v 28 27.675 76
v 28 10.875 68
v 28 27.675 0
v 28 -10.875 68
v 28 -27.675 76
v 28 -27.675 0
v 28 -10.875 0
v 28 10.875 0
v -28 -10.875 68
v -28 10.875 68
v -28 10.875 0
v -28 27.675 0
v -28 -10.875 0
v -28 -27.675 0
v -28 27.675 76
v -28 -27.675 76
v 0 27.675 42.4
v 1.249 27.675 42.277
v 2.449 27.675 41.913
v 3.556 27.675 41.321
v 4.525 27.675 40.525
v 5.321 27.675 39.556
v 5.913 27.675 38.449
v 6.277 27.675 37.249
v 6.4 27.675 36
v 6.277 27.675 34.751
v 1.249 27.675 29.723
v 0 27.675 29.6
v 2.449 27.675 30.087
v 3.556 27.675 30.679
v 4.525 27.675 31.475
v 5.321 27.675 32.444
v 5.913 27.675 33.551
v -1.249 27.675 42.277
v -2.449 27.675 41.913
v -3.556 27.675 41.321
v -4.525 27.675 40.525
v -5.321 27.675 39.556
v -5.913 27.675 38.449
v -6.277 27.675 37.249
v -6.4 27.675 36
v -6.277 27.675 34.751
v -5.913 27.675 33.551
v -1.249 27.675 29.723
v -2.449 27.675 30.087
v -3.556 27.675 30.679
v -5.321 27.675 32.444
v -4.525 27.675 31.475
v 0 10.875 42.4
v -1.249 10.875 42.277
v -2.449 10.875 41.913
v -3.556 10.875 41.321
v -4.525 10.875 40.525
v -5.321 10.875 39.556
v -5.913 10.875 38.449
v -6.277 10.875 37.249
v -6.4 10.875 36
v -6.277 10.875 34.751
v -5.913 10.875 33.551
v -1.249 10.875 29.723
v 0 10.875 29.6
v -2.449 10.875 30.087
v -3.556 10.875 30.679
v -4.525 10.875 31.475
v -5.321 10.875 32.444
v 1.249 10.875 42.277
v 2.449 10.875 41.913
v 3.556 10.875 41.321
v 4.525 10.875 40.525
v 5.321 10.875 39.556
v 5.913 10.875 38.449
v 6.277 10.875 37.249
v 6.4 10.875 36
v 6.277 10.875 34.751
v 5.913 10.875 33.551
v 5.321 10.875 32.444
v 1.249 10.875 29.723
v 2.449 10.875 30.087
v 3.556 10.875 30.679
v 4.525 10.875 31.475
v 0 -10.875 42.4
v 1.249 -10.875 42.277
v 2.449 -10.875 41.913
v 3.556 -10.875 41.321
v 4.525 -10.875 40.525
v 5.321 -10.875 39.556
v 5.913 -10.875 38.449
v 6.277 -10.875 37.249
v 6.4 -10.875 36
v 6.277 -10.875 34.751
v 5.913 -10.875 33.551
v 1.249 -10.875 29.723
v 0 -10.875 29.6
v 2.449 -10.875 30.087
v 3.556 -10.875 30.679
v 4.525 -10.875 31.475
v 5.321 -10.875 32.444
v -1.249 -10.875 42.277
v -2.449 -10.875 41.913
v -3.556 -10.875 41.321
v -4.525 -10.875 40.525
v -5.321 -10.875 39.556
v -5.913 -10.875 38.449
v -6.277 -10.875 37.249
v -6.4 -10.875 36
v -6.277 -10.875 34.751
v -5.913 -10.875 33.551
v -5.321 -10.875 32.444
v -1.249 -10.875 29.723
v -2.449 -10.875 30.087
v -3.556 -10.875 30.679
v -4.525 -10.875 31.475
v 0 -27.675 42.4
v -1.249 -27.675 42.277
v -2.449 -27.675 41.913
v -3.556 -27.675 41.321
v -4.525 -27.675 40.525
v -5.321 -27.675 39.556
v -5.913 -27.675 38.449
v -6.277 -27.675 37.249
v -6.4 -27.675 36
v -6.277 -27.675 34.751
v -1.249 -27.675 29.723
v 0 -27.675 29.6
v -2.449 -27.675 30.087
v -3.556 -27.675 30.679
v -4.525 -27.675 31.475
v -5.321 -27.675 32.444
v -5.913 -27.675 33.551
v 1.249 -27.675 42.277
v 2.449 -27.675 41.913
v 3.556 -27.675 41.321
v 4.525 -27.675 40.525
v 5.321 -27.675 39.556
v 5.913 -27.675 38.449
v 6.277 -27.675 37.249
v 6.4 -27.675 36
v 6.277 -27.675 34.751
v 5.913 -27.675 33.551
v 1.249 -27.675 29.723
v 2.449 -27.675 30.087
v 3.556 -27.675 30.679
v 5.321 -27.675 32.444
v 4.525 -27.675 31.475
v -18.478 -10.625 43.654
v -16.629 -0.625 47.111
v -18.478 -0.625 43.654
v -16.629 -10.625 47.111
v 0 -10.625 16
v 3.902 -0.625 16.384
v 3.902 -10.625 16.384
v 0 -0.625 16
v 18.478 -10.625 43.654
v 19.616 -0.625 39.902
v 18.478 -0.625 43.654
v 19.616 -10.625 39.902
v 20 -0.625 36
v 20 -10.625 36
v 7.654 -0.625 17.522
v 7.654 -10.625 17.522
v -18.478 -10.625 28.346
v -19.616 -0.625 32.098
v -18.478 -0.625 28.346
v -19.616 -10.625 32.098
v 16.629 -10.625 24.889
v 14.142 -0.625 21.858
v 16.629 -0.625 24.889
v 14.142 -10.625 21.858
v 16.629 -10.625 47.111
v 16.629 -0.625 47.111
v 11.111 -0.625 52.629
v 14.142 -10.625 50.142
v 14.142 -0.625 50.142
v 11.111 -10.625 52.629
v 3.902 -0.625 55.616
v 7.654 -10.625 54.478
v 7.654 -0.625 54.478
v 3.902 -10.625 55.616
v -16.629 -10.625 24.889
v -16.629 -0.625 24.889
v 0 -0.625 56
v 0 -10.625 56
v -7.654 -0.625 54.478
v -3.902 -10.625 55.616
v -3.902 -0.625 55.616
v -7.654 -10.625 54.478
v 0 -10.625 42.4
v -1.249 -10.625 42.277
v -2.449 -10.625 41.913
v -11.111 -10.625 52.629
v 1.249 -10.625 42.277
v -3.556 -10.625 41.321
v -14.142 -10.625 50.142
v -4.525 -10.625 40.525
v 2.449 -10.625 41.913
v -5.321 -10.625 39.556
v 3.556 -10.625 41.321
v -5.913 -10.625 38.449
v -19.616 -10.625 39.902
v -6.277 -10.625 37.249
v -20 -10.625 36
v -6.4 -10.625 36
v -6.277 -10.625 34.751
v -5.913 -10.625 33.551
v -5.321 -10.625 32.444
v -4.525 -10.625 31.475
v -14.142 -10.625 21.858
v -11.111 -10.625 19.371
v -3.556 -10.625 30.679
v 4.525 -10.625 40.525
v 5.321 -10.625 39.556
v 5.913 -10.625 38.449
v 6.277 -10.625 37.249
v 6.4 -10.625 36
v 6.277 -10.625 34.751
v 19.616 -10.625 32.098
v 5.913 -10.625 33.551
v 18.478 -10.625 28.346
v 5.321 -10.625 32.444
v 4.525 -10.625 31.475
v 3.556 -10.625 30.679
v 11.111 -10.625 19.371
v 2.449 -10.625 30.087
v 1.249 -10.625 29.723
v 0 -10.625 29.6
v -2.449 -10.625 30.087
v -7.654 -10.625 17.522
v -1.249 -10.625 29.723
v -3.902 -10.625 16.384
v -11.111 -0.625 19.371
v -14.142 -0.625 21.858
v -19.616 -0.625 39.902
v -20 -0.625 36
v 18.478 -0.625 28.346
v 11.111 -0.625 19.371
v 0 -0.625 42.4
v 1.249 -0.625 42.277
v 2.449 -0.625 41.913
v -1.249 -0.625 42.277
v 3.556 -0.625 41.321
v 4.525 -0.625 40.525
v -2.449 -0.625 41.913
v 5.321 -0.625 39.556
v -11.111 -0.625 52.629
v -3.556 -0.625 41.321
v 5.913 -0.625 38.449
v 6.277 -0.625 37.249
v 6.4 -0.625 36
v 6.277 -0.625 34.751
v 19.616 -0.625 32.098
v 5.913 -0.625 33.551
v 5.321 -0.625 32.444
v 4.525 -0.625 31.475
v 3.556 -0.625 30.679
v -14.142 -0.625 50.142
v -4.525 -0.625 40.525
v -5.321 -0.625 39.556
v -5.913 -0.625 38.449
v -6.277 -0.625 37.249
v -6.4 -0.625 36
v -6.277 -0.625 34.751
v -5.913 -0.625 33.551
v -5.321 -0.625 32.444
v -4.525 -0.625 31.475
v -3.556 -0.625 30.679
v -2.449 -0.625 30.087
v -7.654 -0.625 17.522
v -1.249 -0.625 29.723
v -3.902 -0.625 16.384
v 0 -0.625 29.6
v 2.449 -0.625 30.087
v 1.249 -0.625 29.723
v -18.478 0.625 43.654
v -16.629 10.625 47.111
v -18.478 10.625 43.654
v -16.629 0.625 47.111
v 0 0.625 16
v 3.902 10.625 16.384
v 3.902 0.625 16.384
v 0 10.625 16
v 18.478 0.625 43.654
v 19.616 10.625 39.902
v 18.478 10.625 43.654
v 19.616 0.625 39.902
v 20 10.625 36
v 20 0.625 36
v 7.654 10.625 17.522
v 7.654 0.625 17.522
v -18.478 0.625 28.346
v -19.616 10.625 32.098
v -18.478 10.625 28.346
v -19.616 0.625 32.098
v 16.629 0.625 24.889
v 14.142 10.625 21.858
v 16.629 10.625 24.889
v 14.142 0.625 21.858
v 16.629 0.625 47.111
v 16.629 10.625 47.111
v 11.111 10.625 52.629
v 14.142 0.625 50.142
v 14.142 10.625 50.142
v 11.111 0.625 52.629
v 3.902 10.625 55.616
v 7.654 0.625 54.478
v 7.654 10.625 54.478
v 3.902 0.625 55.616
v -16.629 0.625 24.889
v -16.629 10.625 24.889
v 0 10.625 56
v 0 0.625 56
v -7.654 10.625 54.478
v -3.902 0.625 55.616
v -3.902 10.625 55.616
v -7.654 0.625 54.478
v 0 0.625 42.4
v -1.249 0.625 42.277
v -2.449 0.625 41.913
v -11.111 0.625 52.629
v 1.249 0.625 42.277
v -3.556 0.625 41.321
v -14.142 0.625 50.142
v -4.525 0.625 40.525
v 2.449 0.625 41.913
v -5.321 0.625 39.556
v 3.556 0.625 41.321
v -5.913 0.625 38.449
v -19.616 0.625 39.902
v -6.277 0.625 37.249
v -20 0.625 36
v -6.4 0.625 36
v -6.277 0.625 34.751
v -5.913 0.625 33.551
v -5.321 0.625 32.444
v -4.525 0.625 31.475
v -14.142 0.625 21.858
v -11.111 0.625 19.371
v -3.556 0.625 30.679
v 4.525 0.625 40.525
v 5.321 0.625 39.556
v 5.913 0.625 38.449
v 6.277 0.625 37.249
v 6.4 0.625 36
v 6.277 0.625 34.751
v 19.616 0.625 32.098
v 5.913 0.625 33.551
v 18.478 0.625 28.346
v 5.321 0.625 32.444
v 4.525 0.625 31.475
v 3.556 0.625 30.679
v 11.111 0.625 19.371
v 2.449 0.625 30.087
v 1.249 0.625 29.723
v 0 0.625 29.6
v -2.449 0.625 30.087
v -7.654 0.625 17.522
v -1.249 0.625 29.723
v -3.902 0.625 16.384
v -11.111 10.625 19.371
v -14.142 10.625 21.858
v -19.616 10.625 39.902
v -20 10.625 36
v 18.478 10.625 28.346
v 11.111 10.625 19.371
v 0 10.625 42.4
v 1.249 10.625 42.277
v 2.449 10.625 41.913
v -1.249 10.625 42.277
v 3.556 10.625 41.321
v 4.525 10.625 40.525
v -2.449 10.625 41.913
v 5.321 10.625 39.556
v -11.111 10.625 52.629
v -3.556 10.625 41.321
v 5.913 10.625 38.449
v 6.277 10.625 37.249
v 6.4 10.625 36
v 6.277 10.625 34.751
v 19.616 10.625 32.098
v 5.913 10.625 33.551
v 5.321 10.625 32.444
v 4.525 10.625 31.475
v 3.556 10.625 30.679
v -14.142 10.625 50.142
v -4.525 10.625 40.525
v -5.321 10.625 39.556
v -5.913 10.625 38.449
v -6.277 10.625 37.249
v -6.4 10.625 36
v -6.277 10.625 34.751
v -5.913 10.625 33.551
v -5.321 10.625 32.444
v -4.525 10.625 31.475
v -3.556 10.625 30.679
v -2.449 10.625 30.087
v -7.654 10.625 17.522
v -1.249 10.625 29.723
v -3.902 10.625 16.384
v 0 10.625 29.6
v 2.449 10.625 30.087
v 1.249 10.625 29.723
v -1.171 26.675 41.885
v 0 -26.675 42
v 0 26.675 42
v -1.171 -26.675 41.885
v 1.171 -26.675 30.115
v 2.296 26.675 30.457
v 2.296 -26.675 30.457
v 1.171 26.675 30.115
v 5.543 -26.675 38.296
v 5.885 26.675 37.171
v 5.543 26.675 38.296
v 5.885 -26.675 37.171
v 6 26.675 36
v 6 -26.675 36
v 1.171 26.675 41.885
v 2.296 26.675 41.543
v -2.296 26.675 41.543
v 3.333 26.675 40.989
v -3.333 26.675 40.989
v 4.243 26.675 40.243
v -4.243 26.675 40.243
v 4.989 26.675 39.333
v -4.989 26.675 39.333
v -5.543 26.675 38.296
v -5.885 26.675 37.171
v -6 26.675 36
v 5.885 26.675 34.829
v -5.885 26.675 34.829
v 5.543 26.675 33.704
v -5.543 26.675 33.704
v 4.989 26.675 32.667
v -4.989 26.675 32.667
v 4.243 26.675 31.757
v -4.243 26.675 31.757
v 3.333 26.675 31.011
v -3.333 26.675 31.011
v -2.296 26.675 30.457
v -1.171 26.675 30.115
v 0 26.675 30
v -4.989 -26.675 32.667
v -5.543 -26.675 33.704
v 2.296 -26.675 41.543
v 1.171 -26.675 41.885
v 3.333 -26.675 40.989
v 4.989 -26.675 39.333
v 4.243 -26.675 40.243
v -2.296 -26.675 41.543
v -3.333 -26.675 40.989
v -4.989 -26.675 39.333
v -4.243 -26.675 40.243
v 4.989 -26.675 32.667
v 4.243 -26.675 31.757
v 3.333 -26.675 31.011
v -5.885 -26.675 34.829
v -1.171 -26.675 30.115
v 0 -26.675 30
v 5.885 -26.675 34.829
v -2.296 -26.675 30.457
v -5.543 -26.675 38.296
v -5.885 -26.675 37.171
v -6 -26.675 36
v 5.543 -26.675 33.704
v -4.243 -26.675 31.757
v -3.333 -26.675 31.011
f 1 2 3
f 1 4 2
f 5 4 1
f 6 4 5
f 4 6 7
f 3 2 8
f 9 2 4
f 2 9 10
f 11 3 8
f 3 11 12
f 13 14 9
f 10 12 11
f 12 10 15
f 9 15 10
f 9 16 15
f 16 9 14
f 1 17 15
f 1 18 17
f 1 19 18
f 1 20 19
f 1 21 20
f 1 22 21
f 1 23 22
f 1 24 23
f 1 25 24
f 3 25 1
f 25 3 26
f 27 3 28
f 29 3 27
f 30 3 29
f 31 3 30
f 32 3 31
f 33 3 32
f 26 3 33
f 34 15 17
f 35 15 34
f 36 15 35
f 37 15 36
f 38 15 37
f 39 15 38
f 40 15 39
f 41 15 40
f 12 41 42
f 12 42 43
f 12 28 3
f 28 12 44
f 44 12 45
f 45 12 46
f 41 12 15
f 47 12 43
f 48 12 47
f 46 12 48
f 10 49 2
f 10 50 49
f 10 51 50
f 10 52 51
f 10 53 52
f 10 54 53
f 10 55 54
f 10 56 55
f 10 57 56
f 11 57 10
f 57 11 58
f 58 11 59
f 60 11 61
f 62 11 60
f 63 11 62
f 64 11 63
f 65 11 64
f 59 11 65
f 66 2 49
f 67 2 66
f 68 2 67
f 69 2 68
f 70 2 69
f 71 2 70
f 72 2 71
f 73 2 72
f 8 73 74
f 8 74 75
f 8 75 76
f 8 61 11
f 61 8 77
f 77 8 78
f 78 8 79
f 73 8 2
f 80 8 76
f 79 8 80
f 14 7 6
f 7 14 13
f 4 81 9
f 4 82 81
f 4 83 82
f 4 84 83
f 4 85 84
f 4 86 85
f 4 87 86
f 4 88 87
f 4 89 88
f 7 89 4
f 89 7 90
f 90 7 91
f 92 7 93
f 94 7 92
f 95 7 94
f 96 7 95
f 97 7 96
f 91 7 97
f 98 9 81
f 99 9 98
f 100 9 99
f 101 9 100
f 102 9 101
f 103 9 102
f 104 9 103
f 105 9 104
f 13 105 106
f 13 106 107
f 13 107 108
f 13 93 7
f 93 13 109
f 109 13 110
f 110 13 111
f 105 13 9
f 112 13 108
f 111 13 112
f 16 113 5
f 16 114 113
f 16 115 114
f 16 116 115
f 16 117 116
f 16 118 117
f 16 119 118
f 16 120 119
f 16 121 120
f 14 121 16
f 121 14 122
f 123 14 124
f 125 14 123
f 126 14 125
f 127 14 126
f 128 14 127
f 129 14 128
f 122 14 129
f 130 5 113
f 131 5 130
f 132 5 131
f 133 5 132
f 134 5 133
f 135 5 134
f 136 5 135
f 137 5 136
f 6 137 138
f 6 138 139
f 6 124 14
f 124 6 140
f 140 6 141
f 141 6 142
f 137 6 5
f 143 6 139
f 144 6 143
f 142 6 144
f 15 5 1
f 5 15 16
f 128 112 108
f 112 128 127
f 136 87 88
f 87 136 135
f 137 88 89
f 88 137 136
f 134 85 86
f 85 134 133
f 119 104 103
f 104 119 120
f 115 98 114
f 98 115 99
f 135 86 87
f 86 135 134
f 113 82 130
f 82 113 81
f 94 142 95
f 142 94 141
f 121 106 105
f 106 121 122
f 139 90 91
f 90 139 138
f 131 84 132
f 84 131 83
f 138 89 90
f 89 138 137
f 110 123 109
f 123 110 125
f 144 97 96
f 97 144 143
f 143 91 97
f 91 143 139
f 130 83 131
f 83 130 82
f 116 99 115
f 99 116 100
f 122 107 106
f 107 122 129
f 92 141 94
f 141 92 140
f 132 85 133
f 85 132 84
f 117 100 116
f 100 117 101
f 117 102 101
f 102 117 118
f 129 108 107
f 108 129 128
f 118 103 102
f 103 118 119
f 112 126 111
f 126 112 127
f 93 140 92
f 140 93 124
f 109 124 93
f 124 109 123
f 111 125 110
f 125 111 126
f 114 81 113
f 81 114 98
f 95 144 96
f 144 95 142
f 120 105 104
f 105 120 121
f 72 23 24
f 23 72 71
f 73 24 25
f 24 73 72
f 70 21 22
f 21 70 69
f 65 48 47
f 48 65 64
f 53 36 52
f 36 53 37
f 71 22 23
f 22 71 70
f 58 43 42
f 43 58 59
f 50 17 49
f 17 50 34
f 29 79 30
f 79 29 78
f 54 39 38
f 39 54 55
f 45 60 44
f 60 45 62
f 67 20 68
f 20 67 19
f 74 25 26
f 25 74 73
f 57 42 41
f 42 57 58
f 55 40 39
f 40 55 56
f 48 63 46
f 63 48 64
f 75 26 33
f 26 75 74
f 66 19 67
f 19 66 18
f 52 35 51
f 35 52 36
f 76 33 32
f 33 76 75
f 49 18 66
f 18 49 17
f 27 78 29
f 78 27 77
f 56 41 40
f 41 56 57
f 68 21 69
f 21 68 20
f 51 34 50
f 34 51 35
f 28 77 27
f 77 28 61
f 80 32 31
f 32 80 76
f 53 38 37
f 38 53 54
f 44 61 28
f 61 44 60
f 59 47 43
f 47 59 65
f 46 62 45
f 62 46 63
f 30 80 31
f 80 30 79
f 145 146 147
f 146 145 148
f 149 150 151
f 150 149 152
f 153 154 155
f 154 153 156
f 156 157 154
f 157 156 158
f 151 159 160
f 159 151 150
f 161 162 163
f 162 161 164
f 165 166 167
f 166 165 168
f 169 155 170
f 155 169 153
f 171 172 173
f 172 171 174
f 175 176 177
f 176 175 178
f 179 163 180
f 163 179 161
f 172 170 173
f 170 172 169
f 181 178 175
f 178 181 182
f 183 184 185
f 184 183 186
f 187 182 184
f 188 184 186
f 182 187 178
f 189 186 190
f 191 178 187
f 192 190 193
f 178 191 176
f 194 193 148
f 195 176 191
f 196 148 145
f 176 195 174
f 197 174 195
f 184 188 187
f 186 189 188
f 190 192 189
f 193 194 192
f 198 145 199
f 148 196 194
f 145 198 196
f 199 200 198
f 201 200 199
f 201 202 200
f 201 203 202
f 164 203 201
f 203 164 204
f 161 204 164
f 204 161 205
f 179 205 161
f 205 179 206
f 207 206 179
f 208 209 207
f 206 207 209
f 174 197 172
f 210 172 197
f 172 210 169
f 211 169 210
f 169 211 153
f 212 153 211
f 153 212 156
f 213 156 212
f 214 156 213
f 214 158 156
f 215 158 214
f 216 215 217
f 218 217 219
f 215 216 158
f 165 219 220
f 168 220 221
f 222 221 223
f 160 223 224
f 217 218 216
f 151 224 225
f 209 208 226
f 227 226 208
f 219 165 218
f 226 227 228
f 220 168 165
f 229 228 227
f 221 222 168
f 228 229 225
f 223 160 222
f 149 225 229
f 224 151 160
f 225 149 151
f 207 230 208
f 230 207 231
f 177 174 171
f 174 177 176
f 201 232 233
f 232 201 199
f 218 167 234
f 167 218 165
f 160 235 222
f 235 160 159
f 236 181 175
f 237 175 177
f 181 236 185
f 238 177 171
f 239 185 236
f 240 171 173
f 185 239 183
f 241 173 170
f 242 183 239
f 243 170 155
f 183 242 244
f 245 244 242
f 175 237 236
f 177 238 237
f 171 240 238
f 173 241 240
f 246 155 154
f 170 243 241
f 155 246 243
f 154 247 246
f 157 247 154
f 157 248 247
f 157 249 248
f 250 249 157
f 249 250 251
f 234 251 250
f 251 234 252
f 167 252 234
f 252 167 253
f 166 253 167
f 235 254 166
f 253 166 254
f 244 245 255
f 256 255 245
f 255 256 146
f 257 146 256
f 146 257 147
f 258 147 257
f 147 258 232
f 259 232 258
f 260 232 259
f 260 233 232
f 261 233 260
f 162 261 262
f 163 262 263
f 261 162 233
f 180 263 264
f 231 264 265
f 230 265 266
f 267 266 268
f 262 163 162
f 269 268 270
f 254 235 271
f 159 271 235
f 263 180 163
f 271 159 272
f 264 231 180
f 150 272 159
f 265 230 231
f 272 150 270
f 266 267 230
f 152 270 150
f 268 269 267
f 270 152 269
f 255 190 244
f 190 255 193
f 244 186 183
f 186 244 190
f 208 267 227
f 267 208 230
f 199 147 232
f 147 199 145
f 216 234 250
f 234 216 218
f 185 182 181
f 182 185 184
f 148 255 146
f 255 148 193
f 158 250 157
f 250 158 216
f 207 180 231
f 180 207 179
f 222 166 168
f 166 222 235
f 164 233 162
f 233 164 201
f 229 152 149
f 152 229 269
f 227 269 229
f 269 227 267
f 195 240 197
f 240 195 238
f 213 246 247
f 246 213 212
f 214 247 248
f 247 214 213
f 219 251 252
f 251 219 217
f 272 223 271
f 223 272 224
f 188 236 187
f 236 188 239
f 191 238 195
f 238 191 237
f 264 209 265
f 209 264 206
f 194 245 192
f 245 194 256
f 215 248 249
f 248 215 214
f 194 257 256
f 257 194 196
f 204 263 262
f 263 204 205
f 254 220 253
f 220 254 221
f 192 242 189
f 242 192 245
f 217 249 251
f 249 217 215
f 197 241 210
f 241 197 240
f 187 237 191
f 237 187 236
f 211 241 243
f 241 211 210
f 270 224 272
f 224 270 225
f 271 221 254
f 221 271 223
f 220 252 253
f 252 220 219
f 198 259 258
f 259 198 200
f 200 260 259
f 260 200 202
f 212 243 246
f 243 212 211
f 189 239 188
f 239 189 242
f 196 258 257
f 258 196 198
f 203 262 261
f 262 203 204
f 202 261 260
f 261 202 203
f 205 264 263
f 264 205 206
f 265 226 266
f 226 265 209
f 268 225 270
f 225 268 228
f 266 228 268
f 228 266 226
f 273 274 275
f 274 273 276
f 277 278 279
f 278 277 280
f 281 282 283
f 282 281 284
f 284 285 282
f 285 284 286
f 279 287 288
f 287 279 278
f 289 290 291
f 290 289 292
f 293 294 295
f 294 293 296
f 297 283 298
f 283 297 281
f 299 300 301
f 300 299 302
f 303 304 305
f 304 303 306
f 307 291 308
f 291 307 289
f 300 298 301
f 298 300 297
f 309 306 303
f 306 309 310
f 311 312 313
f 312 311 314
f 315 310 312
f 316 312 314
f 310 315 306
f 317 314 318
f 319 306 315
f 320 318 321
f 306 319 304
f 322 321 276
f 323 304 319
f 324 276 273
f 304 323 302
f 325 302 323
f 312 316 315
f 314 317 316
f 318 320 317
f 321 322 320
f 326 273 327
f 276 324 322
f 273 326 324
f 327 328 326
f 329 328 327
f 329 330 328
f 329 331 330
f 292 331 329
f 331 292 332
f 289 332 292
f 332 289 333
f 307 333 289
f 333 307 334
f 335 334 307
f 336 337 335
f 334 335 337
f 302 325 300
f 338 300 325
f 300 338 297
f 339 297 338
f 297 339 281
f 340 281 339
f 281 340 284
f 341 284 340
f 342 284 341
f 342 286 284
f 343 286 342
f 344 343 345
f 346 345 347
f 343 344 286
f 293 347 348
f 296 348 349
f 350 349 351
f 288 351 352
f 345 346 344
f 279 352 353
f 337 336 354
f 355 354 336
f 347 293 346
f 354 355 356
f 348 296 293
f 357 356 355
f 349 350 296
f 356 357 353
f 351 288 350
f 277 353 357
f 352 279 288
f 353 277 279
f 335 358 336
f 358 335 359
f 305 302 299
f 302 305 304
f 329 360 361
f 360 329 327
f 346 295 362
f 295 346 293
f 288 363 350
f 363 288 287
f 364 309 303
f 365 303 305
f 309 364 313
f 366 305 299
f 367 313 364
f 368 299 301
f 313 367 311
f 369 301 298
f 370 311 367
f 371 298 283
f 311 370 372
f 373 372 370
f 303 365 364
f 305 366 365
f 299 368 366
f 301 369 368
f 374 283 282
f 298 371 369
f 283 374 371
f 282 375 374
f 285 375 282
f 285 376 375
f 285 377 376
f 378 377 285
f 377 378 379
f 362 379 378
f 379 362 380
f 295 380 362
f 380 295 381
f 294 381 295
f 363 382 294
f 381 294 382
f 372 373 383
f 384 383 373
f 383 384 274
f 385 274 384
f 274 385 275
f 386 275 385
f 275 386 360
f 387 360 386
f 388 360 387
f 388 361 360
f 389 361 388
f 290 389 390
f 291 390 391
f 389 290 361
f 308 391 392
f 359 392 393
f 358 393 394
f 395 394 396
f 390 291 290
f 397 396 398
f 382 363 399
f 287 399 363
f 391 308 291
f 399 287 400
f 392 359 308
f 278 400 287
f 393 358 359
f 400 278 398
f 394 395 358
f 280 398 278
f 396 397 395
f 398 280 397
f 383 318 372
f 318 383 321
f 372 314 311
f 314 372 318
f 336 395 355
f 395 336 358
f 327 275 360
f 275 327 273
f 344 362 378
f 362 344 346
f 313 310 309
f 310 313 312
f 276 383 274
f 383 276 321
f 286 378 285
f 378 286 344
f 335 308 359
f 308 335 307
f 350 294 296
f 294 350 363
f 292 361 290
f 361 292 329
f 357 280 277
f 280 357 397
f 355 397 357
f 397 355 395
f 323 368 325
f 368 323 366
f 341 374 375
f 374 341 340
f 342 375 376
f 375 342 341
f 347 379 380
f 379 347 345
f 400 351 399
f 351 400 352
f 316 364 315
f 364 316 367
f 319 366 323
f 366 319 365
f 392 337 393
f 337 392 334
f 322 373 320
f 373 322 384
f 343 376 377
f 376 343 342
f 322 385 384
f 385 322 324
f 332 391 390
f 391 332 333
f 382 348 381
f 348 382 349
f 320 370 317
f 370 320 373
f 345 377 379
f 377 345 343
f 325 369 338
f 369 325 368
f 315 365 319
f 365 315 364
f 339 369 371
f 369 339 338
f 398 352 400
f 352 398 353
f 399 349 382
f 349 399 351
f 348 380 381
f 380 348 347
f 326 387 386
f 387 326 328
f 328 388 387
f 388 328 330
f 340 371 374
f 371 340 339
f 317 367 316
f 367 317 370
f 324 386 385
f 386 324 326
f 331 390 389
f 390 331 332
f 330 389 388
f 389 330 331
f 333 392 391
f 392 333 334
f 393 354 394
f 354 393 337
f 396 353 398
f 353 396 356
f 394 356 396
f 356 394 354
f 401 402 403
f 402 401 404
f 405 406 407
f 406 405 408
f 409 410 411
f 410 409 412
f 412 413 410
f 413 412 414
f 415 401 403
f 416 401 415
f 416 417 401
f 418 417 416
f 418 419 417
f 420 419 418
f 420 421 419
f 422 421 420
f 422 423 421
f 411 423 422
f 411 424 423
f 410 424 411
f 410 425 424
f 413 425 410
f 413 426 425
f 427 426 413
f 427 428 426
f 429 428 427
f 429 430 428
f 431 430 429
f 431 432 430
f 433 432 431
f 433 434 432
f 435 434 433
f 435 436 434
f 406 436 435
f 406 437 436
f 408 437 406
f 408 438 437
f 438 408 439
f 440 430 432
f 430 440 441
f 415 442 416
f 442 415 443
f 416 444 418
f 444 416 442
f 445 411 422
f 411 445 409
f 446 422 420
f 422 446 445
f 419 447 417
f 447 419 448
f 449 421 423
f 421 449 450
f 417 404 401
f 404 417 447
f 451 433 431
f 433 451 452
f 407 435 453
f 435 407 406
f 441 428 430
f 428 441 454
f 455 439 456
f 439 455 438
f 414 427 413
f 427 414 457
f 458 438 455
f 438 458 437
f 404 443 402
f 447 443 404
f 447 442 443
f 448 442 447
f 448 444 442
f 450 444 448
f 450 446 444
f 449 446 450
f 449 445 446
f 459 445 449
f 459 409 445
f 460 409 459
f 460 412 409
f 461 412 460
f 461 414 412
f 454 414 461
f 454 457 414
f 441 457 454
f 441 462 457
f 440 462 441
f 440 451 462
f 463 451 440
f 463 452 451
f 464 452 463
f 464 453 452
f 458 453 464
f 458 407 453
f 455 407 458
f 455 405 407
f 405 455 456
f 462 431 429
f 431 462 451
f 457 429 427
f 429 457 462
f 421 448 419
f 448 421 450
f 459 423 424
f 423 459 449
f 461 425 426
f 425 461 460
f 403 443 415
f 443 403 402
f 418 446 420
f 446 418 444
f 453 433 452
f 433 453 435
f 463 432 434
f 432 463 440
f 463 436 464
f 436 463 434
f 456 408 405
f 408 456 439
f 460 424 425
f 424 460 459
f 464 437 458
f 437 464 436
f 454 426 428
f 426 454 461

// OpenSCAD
$fn = 32;

// ------------------------------------------------------------------------
// Trolley wheel set: wheels d40, fork 68 mm tall
// Every part is its own module, assembly() places every instance.
// ------------------------------------------------------------------------

// --- part 1 ---
module trolley_fork() {
  difference() {
    union() {
      translate([-28, 10.875, 0]) cube([56, 16.8, 68]);
      translate([-28, -27.675, 0]) cube([56, 16.8, 68]);
      translate([-28, -27.675, 68]) cube([56, 55.35, 8]);
    }
    translate([0, -19.275, 36]) rotate([90, 0, 0]) cylinder(h = 18.8, d = 12.8, center = true);
    translate([0, 19.275, 36]) rotate([90, 0, 0]) cylinder(h = 18.8, d = 12.8, center = true);
  }
}

// --- part 2 ---
module trolley_wheel() {
  difference() {
      translate([0, 0, 0]) cylinder(h = 10, d = 40);
      translate([0, 0, -1]) cylinder(h = 12, d = 12.8);
    }
}

// --- part 3 ---
module trolley_axle() {
  translate([0, 0, -26.675]) cylinder(h = 53.35, d = 12);
}

// --- assembly ---
module assembly() {
  color([0.80, 0.24, 0.20]) translate([0, 0, 0]) rotate([0, 0, 0]) trolley_fork();
  color([0.20, 0.45, 0.75]) translate([0, -0.625, 36]) rotate([90, 0, 0]) trolley_wheel();
  color([0.25, 0.62, 0.32]) translate([0, 10.625, 36]) rotate([90, 0, 0]) trolley_wheel();
  color([0.92, 0.70, 0.18]) translate([0, 0, 36]) rotate([90, 0, 0]) trolley_axle();
}

assembly();
